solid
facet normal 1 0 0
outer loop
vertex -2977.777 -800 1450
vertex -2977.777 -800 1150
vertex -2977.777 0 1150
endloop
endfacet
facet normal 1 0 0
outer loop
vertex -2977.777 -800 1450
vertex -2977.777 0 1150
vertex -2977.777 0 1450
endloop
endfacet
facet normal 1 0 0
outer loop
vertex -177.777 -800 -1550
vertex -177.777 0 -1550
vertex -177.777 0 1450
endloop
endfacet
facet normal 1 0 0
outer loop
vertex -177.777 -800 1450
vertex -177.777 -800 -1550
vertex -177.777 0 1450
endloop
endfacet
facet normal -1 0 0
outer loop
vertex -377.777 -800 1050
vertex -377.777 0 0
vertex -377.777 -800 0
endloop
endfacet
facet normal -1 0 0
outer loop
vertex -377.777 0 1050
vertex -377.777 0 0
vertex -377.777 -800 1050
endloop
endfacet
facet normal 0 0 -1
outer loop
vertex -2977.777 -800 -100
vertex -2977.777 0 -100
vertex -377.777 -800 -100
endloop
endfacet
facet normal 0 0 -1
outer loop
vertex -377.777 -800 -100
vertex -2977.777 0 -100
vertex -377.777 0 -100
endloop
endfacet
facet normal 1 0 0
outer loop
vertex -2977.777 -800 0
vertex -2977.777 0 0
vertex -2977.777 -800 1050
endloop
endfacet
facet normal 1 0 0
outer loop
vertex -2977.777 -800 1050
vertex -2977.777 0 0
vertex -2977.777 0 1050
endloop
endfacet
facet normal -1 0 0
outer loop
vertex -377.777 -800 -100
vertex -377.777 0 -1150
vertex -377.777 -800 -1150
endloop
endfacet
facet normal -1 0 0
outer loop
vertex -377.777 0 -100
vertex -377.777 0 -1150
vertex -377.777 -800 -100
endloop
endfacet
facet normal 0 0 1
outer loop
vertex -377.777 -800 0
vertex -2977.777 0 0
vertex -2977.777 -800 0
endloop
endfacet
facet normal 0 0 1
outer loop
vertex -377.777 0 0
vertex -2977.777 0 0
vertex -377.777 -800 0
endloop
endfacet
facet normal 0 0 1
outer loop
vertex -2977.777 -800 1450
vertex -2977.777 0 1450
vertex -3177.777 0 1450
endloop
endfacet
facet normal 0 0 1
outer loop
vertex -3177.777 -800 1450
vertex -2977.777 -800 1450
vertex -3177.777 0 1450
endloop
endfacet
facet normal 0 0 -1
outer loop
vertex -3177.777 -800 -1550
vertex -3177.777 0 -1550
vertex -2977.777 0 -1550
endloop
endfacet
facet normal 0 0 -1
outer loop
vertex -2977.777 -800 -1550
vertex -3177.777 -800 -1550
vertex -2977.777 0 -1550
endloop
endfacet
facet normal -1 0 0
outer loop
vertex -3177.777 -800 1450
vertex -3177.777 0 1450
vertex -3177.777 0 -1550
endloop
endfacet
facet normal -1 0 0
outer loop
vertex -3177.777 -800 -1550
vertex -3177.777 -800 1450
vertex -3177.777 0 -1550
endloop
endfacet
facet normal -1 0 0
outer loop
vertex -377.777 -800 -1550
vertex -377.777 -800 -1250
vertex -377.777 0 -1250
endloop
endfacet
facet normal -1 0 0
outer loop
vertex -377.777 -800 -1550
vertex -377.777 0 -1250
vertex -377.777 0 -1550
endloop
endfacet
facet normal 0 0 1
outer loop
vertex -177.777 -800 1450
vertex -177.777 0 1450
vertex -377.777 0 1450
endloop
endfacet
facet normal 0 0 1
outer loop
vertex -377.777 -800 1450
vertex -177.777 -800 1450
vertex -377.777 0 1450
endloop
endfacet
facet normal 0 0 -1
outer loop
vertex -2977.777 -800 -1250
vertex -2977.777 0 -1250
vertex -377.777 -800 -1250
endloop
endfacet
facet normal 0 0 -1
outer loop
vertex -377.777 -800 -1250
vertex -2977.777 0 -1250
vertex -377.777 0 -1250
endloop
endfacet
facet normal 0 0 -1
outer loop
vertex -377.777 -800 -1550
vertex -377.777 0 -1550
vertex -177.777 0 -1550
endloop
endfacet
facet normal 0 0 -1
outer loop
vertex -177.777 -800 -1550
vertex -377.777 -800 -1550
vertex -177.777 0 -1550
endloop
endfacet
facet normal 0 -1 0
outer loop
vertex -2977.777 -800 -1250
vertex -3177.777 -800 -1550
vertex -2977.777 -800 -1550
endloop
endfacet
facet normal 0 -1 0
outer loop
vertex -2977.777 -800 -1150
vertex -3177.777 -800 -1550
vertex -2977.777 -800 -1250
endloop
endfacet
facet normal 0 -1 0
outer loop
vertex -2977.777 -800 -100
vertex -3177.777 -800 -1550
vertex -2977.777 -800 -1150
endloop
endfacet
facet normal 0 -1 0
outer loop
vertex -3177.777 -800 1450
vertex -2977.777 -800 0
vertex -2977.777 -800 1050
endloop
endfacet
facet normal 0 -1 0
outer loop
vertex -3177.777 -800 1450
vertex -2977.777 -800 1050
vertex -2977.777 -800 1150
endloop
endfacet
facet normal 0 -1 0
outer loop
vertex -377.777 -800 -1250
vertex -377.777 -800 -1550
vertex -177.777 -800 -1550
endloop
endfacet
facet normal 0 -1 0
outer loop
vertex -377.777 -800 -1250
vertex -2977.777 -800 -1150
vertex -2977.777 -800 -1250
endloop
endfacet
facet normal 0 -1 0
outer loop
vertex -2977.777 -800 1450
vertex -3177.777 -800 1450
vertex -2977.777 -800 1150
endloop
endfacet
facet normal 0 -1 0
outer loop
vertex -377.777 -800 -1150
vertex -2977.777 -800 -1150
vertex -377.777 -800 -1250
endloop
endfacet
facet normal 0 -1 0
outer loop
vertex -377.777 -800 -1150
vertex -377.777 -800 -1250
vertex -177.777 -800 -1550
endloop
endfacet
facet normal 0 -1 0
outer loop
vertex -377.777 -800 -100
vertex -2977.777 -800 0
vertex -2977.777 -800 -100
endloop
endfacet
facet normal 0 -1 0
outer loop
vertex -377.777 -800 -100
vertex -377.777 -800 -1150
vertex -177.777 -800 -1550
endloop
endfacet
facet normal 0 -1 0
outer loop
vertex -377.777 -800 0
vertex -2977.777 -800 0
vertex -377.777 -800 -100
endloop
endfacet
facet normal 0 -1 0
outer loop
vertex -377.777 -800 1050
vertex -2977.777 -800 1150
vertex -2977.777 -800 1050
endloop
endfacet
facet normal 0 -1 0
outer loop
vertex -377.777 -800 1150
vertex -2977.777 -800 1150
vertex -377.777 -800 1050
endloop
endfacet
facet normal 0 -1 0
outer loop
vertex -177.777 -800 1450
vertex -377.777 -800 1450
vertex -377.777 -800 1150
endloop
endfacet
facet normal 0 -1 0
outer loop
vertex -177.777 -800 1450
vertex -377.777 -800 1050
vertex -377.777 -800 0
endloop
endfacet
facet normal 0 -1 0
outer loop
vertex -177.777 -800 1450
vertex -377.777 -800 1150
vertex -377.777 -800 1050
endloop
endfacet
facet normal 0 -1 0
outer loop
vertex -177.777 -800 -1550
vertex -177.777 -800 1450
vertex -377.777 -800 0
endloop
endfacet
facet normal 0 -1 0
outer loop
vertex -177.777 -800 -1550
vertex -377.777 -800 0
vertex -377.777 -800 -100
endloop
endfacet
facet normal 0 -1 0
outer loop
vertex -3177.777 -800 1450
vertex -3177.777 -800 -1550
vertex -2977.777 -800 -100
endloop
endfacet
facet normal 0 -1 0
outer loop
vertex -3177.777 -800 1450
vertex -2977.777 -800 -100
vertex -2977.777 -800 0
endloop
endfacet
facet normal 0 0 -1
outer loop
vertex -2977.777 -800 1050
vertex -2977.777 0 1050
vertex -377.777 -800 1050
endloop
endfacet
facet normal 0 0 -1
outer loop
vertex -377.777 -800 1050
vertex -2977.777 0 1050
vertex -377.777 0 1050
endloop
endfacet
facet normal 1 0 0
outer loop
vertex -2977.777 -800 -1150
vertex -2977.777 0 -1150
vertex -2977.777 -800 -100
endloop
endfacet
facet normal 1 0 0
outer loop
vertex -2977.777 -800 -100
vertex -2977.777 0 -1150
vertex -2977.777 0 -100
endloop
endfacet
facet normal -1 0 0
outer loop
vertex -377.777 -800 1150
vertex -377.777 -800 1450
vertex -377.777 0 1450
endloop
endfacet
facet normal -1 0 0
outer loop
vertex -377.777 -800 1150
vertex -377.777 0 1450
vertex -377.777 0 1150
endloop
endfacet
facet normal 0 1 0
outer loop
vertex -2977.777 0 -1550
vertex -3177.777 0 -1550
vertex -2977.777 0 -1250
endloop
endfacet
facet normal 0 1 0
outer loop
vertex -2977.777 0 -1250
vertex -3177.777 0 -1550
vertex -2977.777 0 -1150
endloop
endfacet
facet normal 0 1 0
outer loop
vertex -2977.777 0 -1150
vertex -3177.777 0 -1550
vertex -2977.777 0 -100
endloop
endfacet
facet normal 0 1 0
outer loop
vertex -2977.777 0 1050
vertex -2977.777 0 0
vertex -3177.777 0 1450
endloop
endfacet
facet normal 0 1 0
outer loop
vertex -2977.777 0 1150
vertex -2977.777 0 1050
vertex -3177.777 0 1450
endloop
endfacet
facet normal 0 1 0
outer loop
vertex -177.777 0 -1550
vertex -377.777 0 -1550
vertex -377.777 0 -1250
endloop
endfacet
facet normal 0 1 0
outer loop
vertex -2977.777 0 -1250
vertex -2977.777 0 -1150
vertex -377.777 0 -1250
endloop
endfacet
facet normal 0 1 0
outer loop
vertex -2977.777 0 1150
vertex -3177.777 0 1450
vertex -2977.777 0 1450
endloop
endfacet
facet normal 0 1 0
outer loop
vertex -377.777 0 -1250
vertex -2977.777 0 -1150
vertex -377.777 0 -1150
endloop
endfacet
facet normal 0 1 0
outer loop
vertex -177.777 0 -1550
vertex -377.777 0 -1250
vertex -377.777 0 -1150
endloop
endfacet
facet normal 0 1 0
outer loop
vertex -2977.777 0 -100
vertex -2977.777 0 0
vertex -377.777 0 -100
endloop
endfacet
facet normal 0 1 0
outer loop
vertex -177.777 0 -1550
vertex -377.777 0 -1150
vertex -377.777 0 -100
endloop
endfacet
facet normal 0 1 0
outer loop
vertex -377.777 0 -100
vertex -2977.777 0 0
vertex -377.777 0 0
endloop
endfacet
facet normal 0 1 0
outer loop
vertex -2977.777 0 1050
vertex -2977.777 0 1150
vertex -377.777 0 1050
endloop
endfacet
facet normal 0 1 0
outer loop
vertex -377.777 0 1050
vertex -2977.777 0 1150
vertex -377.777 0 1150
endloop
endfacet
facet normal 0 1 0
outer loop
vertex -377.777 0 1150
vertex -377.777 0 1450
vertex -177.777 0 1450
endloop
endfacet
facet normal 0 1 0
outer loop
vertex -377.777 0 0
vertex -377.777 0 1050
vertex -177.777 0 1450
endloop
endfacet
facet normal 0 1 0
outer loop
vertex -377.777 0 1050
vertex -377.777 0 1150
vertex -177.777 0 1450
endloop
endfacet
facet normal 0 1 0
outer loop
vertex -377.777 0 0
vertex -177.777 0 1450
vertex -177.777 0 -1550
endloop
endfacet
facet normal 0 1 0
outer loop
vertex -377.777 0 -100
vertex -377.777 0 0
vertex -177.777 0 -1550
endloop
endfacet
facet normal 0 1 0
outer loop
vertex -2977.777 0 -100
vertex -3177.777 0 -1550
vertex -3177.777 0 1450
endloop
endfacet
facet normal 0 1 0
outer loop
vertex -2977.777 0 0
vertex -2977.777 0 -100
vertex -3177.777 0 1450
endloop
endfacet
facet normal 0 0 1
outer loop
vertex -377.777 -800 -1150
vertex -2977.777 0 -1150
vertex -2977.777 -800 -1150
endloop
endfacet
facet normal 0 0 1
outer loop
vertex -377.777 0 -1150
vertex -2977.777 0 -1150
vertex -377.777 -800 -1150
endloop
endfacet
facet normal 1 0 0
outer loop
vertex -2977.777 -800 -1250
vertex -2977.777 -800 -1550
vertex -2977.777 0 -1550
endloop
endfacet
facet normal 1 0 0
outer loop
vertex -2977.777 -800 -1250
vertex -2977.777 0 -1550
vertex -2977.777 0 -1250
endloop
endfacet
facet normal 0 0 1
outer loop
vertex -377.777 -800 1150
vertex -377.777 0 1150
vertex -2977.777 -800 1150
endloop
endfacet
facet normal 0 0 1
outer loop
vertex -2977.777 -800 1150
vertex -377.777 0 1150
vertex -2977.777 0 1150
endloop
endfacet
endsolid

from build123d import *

# Parameters (mm, degrees)
F0_W     = 2600
F0_H     = 1050
F1_DEPTH = 800


with BuildPart() as f1:
    # F0 (on Front) → F1 (new body)
    with BuildSketch(Plane.XZ):
        Polygon((-2977.776652, -1550), (-2977.776652, -1250), (-377.776652, -1250), (-377.776652, -1550), (-177.776652, -1550), (-177.776652, 1450), (-377.776652, 1450), (-377.776652, 1150), (-2977.776652, 1150), (-2977.776652, 1450), (-3177.776652, 1450), (-3177.776652, -1550), align=None)
        with Locations((-1677.776652, -625)):
            Rectangle(F0_W, F0_H, mode=Mode.SUBTRACT)
        with Locations((-1677.776652, 525)):
            Rectangle(F0_W, F0_H, mode=Mode.SUBTRACT)
    extrude(amount=F1_DEPTH)


solid = f1.part
